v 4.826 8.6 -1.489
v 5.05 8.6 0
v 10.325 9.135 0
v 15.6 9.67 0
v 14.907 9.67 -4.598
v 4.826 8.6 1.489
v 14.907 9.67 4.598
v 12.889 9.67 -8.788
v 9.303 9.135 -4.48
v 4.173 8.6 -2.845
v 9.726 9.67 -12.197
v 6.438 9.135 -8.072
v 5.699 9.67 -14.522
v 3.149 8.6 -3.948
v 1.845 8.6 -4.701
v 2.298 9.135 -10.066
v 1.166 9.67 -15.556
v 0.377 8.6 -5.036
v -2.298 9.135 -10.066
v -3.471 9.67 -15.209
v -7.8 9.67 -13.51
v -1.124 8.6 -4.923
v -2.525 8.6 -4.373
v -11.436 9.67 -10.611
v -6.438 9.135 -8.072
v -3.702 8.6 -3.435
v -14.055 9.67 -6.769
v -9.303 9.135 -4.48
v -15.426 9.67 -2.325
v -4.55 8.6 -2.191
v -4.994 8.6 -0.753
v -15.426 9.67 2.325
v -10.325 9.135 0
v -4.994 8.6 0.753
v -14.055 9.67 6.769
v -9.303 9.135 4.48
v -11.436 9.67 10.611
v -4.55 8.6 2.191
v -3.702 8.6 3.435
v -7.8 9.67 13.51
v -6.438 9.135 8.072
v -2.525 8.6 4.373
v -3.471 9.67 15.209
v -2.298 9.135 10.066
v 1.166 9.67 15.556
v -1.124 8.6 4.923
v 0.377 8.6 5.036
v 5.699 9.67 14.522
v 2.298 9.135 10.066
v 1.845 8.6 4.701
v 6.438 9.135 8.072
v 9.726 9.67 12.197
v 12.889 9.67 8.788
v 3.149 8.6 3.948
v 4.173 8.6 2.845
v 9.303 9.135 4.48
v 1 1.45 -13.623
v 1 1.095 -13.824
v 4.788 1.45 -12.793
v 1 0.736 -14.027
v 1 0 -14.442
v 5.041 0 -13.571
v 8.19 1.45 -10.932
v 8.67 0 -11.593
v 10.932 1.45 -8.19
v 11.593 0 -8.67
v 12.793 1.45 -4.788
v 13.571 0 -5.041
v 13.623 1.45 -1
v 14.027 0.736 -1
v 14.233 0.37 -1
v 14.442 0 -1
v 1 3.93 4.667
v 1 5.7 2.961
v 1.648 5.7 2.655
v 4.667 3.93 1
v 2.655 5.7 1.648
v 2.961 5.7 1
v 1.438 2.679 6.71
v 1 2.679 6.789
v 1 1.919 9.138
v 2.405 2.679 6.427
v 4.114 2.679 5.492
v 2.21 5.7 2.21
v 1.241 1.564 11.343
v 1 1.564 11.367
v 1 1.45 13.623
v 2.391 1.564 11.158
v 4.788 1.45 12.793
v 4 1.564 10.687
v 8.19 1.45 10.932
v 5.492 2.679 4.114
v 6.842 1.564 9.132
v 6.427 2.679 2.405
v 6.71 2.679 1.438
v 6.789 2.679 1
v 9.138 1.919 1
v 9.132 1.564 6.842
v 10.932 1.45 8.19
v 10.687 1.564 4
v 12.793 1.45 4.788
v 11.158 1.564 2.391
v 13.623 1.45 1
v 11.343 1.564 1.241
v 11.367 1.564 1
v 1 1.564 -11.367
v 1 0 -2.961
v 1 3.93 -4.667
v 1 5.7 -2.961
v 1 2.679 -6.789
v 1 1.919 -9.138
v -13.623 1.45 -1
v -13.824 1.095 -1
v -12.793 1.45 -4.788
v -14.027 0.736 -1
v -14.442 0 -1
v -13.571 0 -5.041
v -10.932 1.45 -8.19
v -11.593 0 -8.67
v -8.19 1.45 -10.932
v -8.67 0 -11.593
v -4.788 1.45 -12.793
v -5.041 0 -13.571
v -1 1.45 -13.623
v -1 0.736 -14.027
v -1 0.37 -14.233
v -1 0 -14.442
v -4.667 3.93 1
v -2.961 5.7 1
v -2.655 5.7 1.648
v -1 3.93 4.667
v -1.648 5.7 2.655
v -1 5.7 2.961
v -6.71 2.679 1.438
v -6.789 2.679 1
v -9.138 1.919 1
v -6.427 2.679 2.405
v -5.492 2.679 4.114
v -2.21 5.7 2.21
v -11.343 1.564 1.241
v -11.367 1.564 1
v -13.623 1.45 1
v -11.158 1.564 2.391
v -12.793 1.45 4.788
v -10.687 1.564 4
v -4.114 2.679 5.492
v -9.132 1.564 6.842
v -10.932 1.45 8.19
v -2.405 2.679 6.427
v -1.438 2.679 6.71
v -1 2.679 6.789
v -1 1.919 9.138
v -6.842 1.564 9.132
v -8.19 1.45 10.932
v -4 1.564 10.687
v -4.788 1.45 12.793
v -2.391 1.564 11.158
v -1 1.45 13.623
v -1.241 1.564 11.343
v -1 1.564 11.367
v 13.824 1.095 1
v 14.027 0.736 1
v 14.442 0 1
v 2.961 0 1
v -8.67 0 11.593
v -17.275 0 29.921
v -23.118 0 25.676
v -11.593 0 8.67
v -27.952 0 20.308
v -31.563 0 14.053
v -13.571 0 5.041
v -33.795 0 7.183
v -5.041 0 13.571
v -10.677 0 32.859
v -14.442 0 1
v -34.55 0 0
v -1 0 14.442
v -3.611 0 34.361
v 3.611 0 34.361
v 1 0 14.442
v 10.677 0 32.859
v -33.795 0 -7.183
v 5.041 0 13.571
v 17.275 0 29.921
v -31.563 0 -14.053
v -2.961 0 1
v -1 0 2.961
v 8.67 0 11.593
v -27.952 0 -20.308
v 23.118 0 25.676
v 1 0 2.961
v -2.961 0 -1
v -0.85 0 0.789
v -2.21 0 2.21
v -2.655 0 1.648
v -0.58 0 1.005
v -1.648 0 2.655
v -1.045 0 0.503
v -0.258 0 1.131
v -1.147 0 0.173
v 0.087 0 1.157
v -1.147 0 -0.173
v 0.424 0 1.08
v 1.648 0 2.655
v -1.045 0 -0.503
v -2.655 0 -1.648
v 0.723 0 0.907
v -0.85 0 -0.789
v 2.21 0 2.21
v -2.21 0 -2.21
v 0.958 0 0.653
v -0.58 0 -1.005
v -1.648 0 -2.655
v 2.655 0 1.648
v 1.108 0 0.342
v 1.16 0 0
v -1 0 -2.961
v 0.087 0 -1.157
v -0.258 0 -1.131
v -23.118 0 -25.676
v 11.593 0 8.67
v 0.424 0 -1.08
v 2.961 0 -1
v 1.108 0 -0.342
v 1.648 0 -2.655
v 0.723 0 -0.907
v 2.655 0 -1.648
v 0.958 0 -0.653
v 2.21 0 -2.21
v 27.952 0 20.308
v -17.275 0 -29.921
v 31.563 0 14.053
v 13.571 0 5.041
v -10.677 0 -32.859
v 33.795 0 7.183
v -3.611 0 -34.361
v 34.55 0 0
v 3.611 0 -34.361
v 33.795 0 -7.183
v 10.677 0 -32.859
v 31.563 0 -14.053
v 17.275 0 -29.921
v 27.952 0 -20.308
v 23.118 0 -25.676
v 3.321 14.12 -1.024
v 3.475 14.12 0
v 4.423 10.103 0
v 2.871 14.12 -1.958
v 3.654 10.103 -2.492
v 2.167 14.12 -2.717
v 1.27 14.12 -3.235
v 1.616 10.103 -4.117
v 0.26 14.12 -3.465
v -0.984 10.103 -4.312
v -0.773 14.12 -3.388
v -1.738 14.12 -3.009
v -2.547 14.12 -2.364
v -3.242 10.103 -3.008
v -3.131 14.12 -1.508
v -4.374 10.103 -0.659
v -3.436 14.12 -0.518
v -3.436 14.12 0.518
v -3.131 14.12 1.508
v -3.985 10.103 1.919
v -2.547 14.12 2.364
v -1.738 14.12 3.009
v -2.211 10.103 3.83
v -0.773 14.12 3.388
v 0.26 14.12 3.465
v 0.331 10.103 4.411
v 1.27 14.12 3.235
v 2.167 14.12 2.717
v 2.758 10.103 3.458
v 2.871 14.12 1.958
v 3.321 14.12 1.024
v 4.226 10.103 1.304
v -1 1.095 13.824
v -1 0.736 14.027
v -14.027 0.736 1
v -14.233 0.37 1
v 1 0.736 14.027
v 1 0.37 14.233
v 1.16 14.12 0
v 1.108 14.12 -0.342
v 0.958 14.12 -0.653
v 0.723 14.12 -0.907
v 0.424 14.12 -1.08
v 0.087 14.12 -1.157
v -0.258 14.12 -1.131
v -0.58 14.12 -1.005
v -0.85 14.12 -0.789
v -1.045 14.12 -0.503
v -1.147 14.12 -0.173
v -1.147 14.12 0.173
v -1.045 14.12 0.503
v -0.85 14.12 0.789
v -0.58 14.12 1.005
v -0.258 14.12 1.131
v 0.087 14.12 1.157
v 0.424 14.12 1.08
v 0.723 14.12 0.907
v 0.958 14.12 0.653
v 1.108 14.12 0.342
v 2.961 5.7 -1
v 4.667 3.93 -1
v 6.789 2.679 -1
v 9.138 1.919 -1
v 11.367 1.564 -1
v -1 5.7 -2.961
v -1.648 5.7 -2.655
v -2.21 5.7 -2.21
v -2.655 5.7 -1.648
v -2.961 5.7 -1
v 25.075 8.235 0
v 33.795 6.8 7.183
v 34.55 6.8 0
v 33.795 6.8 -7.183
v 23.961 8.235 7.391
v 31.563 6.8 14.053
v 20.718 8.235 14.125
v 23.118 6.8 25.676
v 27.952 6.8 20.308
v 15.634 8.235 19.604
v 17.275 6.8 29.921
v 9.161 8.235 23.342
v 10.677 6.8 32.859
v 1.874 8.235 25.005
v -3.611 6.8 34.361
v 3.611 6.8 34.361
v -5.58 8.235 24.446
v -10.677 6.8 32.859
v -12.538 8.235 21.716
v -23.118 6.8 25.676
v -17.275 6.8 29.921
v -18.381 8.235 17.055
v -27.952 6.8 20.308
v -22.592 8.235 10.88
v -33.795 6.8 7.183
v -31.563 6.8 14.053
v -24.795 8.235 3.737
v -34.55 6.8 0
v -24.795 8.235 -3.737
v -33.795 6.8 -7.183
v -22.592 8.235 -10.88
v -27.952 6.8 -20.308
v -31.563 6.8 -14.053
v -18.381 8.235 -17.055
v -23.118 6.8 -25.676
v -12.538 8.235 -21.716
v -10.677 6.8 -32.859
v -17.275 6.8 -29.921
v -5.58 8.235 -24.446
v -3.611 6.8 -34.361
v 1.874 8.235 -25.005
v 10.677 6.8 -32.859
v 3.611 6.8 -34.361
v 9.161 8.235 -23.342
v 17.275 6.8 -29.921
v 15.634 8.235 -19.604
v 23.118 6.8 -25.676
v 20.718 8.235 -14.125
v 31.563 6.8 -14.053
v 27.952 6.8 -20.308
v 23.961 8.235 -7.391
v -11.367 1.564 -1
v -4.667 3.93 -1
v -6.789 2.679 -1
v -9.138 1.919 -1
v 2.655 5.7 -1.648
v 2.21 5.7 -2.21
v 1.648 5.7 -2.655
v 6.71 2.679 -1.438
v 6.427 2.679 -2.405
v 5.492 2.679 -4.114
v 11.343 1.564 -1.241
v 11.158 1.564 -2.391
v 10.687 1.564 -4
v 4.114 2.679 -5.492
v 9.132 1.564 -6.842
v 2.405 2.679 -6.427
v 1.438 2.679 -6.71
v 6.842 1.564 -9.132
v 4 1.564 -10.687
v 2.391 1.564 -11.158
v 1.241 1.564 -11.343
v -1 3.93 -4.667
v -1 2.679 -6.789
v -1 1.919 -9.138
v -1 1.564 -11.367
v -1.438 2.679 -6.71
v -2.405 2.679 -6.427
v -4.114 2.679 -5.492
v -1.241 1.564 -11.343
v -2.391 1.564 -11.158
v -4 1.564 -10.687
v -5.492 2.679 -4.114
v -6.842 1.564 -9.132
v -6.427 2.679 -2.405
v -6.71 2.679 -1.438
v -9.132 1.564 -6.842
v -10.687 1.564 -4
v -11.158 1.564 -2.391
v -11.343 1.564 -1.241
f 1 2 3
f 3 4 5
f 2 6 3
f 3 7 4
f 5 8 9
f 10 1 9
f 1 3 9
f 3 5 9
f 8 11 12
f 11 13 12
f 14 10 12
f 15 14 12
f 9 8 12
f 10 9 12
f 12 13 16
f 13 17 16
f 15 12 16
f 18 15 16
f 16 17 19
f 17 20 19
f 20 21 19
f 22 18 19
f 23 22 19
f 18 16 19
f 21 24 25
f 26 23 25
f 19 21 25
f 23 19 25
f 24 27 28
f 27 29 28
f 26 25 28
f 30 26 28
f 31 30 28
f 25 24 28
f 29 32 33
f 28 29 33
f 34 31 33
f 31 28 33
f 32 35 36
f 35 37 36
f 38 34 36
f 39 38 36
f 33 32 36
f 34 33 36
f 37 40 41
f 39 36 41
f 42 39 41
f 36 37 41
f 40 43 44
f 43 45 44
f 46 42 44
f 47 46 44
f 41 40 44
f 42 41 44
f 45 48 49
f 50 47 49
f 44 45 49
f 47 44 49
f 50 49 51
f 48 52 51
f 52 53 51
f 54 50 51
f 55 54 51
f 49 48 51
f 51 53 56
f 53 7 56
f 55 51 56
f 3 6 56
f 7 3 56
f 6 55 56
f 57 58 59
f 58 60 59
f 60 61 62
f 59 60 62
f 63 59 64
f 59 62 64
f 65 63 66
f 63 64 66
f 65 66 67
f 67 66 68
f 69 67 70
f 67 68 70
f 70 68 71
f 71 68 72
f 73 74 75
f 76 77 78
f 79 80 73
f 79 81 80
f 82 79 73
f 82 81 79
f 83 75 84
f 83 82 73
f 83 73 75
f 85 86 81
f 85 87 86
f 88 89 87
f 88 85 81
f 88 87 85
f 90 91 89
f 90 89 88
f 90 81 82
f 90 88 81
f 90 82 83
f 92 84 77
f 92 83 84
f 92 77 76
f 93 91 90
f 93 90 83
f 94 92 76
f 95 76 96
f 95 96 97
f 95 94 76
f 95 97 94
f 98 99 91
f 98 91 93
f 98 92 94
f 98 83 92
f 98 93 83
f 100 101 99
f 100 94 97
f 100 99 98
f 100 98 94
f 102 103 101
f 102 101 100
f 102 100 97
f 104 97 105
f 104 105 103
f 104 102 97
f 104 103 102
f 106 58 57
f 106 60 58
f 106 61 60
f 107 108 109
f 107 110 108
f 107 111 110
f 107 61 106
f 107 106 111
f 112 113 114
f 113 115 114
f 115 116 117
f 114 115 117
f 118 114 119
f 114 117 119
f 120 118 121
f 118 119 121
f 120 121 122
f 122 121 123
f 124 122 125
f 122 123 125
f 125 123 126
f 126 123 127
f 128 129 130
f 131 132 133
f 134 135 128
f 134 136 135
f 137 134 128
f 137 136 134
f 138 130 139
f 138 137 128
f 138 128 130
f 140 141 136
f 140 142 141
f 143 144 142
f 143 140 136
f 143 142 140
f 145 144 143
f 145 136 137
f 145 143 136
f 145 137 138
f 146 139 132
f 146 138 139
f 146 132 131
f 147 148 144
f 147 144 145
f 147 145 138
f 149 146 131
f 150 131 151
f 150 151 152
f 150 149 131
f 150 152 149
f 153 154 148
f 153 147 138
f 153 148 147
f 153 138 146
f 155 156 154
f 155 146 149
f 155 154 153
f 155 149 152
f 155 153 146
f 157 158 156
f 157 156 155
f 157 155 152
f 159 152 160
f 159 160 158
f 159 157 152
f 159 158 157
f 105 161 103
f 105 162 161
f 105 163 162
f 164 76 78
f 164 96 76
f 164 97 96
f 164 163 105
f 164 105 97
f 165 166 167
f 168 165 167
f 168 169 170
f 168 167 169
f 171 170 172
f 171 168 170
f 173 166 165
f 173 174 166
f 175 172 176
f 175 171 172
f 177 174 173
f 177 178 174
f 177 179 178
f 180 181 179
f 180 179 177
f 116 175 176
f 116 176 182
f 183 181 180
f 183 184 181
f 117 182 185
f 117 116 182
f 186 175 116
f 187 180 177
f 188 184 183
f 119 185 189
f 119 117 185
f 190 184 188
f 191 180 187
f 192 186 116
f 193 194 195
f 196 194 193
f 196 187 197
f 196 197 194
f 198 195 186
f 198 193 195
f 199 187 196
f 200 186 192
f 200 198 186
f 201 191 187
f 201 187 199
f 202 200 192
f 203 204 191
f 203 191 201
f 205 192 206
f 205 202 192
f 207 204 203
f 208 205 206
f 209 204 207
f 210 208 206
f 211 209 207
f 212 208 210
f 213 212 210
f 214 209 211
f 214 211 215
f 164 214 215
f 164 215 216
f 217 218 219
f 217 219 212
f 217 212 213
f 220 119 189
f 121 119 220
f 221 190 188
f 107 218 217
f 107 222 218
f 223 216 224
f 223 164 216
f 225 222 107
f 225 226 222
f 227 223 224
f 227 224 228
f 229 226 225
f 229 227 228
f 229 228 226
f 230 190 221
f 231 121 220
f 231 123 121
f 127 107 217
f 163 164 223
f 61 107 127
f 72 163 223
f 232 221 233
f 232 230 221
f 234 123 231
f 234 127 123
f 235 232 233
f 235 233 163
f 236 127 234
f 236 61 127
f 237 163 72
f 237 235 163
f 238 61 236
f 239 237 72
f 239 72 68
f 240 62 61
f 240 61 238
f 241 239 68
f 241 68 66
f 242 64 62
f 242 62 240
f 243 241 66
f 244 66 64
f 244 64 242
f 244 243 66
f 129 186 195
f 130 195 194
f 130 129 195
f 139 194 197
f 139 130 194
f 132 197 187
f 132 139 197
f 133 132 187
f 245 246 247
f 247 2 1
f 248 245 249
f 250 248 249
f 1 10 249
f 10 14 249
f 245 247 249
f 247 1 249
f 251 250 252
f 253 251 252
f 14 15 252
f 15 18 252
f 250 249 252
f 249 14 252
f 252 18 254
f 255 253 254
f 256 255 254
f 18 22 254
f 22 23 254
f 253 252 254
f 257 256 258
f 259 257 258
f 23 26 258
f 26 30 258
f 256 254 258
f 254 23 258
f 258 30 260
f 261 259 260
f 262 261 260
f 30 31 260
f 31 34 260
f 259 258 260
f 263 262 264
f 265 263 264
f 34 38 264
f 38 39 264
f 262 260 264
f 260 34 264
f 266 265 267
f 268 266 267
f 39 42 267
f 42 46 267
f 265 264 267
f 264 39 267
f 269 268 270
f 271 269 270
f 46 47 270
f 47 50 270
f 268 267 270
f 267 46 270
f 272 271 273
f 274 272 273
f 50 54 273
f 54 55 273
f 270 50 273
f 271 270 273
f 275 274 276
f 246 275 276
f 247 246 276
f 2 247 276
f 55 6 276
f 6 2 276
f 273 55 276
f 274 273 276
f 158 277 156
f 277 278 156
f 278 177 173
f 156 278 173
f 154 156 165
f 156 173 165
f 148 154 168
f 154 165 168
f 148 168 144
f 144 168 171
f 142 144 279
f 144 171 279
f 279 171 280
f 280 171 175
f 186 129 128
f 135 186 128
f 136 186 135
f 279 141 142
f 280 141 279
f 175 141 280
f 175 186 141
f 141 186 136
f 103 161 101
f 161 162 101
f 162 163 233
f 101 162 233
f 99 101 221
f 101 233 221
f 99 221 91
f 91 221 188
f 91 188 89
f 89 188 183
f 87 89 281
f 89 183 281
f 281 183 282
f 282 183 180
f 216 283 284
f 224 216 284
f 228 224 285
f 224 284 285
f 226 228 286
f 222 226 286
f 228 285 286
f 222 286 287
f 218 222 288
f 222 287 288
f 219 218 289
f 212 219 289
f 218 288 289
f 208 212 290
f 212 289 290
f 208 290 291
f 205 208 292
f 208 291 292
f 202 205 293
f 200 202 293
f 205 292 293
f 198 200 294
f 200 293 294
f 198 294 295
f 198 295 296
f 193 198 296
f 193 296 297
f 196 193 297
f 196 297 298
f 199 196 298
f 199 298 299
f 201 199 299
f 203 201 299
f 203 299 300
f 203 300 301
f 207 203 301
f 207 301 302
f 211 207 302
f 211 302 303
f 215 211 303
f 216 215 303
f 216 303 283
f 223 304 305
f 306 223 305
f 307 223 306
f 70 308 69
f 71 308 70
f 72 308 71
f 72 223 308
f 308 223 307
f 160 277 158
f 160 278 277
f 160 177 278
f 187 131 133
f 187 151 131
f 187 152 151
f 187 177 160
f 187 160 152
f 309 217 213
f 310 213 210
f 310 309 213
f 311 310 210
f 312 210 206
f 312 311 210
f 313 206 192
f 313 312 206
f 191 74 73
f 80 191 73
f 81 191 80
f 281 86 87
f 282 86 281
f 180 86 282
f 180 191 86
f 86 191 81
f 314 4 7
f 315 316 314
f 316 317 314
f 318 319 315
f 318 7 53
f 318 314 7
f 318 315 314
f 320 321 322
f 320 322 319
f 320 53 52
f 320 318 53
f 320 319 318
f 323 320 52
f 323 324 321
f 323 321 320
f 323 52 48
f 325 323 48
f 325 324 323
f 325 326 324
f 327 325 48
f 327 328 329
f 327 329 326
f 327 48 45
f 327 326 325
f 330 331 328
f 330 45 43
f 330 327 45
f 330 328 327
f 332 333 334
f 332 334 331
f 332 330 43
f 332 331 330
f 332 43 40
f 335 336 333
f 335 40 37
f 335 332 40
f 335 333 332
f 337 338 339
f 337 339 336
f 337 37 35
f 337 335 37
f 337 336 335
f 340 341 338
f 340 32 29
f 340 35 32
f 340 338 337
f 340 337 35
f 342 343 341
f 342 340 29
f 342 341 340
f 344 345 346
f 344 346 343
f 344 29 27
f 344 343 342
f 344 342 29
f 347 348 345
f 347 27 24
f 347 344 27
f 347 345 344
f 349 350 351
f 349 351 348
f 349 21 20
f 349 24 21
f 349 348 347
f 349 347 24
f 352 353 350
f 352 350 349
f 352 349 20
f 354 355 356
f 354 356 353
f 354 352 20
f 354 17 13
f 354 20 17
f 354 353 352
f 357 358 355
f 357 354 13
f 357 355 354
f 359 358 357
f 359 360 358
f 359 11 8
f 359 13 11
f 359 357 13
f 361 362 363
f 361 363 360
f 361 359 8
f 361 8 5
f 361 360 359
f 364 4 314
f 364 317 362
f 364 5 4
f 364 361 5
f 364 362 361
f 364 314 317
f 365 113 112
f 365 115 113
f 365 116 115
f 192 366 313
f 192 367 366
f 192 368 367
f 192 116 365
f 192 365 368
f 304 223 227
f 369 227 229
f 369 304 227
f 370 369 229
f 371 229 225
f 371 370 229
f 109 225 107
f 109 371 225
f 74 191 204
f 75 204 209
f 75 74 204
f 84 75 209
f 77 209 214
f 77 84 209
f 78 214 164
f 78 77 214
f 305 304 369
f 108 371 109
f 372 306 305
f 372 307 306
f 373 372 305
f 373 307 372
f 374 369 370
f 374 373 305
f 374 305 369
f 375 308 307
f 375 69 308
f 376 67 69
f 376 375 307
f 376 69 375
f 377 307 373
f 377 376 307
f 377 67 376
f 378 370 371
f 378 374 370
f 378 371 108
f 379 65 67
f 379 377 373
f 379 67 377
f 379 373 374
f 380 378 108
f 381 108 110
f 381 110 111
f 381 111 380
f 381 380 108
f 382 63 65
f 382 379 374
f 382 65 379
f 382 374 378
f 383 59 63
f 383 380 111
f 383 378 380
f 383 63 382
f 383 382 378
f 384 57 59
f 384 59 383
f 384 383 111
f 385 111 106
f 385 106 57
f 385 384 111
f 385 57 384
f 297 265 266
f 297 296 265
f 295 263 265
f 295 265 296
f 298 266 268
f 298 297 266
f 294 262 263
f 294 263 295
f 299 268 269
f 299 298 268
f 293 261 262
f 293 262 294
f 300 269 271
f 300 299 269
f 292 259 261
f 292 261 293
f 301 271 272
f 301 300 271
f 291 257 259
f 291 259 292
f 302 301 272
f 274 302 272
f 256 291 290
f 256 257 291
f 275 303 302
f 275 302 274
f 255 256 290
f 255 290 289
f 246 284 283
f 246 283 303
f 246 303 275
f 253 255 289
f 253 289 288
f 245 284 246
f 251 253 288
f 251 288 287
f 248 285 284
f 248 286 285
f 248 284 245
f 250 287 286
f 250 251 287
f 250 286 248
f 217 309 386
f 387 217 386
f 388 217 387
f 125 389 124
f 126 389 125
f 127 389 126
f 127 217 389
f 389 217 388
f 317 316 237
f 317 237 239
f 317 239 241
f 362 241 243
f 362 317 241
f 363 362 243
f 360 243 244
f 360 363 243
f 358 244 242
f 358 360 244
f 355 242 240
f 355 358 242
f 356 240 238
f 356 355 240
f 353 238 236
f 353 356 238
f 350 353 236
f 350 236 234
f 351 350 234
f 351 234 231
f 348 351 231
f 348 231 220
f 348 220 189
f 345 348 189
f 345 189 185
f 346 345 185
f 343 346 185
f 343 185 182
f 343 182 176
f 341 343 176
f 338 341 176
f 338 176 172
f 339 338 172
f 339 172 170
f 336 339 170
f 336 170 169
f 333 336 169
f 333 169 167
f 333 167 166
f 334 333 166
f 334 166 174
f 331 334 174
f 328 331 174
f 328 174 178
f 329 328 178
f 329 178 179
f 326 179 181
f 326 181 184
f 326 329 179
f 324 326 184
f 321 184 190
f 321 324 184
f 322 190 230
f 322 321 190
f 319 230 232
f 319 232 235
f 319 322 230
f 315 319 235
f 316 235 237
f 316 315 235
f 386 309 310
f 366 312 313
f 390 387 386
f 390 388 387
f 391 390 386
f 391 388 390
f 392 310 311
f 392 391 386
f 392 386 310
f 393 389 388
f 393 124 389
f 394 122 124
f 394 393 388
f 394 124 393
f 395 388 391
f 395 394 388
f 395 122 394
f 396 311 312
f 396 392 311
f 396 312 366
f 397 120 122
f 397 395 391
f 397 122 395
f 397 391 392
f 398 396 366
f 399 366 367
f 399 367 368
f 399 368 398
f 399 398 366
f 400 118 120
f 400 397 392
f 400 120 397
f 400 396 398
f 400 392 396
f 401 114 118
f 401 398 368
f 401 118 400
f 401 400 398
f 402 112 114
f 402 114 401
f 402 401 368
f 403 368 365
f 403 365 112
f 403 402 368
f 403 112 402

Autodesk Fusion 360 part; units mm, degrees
sketch "Sketch1" plane through (0, 0, 0) normal (0, 0, 1) x (1, 0, 0)
  line L0 (0, 0) -> (34.55, 0)
  line L1 (34.55, 0) -> (34.55, 6.8)
  line L2 (15.6, 0) -> (15.6, 9.67) construction
  line L3 (34.55, 6.8) -> (15.6, 9.67)
  line L4 (5.05, 0) -> (5.05, 8.6) construction
  line L5 (15.6, 9.67) -> (5.05, 8.6)
  line L6 (0, 0) -> (0, 14.12)
  line L7 (0, 14.12) -> (3.475, 14.12)
  spline S0 degree 2 poles (3.475, 14.12) (4.5, 9.5) (5.05, 8.6) knots 0 0 0 0.575587 0.575587 0.575587 weights 1 2.082456 1
  line L8 (3.125, 0) -> (3.125, 5.7)
  line L9 (3.125, 5.7) -> (0, 5.7)
  line L10 (13.66, 0) -> (13.66, 1.45) construction
  spline S1 degree 2 poles (3.125, 5.7) (6, 1.5) (13.66, 1.45) knots 0 0 0 1.170983 1.170983 1.170983
  line L11 (13.66, 1.45) -> (14.4767, 0)
  line L12 (1.16, 0) -> (1.16, 14.12)
  dimension "d1" = 34.55
  dimension "d2" = 6.8
  dimension "d3" = 9.67
  dimension "d4" = 15.6
  dimension "d5" = 8.6
  dimension "d6" = 5.05
  dimension "d7" = 14.12
  dimension "d8" = 3.475
  dimension "d9" = 3.125
  dimension "d10" = 5.7
  dimension "d11" = 1.45
  dimension "d12" = 13.66
  dimension "d13" = 1.16
revolve "Revolve1" add sketch "Sketch1" angle 360 about axis through (0, 0, 0) along (0, 1, 0) contours L0 L8 L9 L12 | L0 L1 L3 L5 L7 S0 L9 S1 L11 L12
sketch "Sketch2" plane through (0, 0, 0) normal (0, -1, 0) x (1, 0, 0)
  circle A0 centre (0, 0) radius 3.125
  circle A1 centre (0, 0) radius 1.16
  line L0 (1, 2.9607) -> (1, 14.4421)
  circle A2 centre (0, 0) radius 34.55
  circle A3 centre (0, 0) radius 14.4767
  line L1 (-1, 14.4421) -> (-1, 2.9607)
  line L2 (0, 3.125) -> (0, 14.4767) construction
  line L3 (0, 0) -> (0, 3.125) construction
  dimension "d15" = 2
extrude "Extrude1" add sketch "Sketch2" against normal blind 7 contours A0 L0 A3 L1 picked at (-0.5123, 10.6778)
pattern_circular "C-Pattern1" count 4 over 360 about axis through (0, 5.7, 0) along (0, -1, 0) of "Extrude1"
equation "d1 = ( 69.1 / 2 ) * 1 mm"
equation "d4 = ( 31.2 / 2 ) * 1 mm"
equation "d6 = ( 10.1 / 2 ) * 1 mm"
equation "d8 = ( 6.95 / 2 ) * 1 mm"
equation "d9 = ( 6.25 / 2 ) * 1 mm"
equation "d12 = ( 27.32 / 2 ) * 1 mm"
equation "d13 = ( 2.32 / 2 ) * 1 mm"
